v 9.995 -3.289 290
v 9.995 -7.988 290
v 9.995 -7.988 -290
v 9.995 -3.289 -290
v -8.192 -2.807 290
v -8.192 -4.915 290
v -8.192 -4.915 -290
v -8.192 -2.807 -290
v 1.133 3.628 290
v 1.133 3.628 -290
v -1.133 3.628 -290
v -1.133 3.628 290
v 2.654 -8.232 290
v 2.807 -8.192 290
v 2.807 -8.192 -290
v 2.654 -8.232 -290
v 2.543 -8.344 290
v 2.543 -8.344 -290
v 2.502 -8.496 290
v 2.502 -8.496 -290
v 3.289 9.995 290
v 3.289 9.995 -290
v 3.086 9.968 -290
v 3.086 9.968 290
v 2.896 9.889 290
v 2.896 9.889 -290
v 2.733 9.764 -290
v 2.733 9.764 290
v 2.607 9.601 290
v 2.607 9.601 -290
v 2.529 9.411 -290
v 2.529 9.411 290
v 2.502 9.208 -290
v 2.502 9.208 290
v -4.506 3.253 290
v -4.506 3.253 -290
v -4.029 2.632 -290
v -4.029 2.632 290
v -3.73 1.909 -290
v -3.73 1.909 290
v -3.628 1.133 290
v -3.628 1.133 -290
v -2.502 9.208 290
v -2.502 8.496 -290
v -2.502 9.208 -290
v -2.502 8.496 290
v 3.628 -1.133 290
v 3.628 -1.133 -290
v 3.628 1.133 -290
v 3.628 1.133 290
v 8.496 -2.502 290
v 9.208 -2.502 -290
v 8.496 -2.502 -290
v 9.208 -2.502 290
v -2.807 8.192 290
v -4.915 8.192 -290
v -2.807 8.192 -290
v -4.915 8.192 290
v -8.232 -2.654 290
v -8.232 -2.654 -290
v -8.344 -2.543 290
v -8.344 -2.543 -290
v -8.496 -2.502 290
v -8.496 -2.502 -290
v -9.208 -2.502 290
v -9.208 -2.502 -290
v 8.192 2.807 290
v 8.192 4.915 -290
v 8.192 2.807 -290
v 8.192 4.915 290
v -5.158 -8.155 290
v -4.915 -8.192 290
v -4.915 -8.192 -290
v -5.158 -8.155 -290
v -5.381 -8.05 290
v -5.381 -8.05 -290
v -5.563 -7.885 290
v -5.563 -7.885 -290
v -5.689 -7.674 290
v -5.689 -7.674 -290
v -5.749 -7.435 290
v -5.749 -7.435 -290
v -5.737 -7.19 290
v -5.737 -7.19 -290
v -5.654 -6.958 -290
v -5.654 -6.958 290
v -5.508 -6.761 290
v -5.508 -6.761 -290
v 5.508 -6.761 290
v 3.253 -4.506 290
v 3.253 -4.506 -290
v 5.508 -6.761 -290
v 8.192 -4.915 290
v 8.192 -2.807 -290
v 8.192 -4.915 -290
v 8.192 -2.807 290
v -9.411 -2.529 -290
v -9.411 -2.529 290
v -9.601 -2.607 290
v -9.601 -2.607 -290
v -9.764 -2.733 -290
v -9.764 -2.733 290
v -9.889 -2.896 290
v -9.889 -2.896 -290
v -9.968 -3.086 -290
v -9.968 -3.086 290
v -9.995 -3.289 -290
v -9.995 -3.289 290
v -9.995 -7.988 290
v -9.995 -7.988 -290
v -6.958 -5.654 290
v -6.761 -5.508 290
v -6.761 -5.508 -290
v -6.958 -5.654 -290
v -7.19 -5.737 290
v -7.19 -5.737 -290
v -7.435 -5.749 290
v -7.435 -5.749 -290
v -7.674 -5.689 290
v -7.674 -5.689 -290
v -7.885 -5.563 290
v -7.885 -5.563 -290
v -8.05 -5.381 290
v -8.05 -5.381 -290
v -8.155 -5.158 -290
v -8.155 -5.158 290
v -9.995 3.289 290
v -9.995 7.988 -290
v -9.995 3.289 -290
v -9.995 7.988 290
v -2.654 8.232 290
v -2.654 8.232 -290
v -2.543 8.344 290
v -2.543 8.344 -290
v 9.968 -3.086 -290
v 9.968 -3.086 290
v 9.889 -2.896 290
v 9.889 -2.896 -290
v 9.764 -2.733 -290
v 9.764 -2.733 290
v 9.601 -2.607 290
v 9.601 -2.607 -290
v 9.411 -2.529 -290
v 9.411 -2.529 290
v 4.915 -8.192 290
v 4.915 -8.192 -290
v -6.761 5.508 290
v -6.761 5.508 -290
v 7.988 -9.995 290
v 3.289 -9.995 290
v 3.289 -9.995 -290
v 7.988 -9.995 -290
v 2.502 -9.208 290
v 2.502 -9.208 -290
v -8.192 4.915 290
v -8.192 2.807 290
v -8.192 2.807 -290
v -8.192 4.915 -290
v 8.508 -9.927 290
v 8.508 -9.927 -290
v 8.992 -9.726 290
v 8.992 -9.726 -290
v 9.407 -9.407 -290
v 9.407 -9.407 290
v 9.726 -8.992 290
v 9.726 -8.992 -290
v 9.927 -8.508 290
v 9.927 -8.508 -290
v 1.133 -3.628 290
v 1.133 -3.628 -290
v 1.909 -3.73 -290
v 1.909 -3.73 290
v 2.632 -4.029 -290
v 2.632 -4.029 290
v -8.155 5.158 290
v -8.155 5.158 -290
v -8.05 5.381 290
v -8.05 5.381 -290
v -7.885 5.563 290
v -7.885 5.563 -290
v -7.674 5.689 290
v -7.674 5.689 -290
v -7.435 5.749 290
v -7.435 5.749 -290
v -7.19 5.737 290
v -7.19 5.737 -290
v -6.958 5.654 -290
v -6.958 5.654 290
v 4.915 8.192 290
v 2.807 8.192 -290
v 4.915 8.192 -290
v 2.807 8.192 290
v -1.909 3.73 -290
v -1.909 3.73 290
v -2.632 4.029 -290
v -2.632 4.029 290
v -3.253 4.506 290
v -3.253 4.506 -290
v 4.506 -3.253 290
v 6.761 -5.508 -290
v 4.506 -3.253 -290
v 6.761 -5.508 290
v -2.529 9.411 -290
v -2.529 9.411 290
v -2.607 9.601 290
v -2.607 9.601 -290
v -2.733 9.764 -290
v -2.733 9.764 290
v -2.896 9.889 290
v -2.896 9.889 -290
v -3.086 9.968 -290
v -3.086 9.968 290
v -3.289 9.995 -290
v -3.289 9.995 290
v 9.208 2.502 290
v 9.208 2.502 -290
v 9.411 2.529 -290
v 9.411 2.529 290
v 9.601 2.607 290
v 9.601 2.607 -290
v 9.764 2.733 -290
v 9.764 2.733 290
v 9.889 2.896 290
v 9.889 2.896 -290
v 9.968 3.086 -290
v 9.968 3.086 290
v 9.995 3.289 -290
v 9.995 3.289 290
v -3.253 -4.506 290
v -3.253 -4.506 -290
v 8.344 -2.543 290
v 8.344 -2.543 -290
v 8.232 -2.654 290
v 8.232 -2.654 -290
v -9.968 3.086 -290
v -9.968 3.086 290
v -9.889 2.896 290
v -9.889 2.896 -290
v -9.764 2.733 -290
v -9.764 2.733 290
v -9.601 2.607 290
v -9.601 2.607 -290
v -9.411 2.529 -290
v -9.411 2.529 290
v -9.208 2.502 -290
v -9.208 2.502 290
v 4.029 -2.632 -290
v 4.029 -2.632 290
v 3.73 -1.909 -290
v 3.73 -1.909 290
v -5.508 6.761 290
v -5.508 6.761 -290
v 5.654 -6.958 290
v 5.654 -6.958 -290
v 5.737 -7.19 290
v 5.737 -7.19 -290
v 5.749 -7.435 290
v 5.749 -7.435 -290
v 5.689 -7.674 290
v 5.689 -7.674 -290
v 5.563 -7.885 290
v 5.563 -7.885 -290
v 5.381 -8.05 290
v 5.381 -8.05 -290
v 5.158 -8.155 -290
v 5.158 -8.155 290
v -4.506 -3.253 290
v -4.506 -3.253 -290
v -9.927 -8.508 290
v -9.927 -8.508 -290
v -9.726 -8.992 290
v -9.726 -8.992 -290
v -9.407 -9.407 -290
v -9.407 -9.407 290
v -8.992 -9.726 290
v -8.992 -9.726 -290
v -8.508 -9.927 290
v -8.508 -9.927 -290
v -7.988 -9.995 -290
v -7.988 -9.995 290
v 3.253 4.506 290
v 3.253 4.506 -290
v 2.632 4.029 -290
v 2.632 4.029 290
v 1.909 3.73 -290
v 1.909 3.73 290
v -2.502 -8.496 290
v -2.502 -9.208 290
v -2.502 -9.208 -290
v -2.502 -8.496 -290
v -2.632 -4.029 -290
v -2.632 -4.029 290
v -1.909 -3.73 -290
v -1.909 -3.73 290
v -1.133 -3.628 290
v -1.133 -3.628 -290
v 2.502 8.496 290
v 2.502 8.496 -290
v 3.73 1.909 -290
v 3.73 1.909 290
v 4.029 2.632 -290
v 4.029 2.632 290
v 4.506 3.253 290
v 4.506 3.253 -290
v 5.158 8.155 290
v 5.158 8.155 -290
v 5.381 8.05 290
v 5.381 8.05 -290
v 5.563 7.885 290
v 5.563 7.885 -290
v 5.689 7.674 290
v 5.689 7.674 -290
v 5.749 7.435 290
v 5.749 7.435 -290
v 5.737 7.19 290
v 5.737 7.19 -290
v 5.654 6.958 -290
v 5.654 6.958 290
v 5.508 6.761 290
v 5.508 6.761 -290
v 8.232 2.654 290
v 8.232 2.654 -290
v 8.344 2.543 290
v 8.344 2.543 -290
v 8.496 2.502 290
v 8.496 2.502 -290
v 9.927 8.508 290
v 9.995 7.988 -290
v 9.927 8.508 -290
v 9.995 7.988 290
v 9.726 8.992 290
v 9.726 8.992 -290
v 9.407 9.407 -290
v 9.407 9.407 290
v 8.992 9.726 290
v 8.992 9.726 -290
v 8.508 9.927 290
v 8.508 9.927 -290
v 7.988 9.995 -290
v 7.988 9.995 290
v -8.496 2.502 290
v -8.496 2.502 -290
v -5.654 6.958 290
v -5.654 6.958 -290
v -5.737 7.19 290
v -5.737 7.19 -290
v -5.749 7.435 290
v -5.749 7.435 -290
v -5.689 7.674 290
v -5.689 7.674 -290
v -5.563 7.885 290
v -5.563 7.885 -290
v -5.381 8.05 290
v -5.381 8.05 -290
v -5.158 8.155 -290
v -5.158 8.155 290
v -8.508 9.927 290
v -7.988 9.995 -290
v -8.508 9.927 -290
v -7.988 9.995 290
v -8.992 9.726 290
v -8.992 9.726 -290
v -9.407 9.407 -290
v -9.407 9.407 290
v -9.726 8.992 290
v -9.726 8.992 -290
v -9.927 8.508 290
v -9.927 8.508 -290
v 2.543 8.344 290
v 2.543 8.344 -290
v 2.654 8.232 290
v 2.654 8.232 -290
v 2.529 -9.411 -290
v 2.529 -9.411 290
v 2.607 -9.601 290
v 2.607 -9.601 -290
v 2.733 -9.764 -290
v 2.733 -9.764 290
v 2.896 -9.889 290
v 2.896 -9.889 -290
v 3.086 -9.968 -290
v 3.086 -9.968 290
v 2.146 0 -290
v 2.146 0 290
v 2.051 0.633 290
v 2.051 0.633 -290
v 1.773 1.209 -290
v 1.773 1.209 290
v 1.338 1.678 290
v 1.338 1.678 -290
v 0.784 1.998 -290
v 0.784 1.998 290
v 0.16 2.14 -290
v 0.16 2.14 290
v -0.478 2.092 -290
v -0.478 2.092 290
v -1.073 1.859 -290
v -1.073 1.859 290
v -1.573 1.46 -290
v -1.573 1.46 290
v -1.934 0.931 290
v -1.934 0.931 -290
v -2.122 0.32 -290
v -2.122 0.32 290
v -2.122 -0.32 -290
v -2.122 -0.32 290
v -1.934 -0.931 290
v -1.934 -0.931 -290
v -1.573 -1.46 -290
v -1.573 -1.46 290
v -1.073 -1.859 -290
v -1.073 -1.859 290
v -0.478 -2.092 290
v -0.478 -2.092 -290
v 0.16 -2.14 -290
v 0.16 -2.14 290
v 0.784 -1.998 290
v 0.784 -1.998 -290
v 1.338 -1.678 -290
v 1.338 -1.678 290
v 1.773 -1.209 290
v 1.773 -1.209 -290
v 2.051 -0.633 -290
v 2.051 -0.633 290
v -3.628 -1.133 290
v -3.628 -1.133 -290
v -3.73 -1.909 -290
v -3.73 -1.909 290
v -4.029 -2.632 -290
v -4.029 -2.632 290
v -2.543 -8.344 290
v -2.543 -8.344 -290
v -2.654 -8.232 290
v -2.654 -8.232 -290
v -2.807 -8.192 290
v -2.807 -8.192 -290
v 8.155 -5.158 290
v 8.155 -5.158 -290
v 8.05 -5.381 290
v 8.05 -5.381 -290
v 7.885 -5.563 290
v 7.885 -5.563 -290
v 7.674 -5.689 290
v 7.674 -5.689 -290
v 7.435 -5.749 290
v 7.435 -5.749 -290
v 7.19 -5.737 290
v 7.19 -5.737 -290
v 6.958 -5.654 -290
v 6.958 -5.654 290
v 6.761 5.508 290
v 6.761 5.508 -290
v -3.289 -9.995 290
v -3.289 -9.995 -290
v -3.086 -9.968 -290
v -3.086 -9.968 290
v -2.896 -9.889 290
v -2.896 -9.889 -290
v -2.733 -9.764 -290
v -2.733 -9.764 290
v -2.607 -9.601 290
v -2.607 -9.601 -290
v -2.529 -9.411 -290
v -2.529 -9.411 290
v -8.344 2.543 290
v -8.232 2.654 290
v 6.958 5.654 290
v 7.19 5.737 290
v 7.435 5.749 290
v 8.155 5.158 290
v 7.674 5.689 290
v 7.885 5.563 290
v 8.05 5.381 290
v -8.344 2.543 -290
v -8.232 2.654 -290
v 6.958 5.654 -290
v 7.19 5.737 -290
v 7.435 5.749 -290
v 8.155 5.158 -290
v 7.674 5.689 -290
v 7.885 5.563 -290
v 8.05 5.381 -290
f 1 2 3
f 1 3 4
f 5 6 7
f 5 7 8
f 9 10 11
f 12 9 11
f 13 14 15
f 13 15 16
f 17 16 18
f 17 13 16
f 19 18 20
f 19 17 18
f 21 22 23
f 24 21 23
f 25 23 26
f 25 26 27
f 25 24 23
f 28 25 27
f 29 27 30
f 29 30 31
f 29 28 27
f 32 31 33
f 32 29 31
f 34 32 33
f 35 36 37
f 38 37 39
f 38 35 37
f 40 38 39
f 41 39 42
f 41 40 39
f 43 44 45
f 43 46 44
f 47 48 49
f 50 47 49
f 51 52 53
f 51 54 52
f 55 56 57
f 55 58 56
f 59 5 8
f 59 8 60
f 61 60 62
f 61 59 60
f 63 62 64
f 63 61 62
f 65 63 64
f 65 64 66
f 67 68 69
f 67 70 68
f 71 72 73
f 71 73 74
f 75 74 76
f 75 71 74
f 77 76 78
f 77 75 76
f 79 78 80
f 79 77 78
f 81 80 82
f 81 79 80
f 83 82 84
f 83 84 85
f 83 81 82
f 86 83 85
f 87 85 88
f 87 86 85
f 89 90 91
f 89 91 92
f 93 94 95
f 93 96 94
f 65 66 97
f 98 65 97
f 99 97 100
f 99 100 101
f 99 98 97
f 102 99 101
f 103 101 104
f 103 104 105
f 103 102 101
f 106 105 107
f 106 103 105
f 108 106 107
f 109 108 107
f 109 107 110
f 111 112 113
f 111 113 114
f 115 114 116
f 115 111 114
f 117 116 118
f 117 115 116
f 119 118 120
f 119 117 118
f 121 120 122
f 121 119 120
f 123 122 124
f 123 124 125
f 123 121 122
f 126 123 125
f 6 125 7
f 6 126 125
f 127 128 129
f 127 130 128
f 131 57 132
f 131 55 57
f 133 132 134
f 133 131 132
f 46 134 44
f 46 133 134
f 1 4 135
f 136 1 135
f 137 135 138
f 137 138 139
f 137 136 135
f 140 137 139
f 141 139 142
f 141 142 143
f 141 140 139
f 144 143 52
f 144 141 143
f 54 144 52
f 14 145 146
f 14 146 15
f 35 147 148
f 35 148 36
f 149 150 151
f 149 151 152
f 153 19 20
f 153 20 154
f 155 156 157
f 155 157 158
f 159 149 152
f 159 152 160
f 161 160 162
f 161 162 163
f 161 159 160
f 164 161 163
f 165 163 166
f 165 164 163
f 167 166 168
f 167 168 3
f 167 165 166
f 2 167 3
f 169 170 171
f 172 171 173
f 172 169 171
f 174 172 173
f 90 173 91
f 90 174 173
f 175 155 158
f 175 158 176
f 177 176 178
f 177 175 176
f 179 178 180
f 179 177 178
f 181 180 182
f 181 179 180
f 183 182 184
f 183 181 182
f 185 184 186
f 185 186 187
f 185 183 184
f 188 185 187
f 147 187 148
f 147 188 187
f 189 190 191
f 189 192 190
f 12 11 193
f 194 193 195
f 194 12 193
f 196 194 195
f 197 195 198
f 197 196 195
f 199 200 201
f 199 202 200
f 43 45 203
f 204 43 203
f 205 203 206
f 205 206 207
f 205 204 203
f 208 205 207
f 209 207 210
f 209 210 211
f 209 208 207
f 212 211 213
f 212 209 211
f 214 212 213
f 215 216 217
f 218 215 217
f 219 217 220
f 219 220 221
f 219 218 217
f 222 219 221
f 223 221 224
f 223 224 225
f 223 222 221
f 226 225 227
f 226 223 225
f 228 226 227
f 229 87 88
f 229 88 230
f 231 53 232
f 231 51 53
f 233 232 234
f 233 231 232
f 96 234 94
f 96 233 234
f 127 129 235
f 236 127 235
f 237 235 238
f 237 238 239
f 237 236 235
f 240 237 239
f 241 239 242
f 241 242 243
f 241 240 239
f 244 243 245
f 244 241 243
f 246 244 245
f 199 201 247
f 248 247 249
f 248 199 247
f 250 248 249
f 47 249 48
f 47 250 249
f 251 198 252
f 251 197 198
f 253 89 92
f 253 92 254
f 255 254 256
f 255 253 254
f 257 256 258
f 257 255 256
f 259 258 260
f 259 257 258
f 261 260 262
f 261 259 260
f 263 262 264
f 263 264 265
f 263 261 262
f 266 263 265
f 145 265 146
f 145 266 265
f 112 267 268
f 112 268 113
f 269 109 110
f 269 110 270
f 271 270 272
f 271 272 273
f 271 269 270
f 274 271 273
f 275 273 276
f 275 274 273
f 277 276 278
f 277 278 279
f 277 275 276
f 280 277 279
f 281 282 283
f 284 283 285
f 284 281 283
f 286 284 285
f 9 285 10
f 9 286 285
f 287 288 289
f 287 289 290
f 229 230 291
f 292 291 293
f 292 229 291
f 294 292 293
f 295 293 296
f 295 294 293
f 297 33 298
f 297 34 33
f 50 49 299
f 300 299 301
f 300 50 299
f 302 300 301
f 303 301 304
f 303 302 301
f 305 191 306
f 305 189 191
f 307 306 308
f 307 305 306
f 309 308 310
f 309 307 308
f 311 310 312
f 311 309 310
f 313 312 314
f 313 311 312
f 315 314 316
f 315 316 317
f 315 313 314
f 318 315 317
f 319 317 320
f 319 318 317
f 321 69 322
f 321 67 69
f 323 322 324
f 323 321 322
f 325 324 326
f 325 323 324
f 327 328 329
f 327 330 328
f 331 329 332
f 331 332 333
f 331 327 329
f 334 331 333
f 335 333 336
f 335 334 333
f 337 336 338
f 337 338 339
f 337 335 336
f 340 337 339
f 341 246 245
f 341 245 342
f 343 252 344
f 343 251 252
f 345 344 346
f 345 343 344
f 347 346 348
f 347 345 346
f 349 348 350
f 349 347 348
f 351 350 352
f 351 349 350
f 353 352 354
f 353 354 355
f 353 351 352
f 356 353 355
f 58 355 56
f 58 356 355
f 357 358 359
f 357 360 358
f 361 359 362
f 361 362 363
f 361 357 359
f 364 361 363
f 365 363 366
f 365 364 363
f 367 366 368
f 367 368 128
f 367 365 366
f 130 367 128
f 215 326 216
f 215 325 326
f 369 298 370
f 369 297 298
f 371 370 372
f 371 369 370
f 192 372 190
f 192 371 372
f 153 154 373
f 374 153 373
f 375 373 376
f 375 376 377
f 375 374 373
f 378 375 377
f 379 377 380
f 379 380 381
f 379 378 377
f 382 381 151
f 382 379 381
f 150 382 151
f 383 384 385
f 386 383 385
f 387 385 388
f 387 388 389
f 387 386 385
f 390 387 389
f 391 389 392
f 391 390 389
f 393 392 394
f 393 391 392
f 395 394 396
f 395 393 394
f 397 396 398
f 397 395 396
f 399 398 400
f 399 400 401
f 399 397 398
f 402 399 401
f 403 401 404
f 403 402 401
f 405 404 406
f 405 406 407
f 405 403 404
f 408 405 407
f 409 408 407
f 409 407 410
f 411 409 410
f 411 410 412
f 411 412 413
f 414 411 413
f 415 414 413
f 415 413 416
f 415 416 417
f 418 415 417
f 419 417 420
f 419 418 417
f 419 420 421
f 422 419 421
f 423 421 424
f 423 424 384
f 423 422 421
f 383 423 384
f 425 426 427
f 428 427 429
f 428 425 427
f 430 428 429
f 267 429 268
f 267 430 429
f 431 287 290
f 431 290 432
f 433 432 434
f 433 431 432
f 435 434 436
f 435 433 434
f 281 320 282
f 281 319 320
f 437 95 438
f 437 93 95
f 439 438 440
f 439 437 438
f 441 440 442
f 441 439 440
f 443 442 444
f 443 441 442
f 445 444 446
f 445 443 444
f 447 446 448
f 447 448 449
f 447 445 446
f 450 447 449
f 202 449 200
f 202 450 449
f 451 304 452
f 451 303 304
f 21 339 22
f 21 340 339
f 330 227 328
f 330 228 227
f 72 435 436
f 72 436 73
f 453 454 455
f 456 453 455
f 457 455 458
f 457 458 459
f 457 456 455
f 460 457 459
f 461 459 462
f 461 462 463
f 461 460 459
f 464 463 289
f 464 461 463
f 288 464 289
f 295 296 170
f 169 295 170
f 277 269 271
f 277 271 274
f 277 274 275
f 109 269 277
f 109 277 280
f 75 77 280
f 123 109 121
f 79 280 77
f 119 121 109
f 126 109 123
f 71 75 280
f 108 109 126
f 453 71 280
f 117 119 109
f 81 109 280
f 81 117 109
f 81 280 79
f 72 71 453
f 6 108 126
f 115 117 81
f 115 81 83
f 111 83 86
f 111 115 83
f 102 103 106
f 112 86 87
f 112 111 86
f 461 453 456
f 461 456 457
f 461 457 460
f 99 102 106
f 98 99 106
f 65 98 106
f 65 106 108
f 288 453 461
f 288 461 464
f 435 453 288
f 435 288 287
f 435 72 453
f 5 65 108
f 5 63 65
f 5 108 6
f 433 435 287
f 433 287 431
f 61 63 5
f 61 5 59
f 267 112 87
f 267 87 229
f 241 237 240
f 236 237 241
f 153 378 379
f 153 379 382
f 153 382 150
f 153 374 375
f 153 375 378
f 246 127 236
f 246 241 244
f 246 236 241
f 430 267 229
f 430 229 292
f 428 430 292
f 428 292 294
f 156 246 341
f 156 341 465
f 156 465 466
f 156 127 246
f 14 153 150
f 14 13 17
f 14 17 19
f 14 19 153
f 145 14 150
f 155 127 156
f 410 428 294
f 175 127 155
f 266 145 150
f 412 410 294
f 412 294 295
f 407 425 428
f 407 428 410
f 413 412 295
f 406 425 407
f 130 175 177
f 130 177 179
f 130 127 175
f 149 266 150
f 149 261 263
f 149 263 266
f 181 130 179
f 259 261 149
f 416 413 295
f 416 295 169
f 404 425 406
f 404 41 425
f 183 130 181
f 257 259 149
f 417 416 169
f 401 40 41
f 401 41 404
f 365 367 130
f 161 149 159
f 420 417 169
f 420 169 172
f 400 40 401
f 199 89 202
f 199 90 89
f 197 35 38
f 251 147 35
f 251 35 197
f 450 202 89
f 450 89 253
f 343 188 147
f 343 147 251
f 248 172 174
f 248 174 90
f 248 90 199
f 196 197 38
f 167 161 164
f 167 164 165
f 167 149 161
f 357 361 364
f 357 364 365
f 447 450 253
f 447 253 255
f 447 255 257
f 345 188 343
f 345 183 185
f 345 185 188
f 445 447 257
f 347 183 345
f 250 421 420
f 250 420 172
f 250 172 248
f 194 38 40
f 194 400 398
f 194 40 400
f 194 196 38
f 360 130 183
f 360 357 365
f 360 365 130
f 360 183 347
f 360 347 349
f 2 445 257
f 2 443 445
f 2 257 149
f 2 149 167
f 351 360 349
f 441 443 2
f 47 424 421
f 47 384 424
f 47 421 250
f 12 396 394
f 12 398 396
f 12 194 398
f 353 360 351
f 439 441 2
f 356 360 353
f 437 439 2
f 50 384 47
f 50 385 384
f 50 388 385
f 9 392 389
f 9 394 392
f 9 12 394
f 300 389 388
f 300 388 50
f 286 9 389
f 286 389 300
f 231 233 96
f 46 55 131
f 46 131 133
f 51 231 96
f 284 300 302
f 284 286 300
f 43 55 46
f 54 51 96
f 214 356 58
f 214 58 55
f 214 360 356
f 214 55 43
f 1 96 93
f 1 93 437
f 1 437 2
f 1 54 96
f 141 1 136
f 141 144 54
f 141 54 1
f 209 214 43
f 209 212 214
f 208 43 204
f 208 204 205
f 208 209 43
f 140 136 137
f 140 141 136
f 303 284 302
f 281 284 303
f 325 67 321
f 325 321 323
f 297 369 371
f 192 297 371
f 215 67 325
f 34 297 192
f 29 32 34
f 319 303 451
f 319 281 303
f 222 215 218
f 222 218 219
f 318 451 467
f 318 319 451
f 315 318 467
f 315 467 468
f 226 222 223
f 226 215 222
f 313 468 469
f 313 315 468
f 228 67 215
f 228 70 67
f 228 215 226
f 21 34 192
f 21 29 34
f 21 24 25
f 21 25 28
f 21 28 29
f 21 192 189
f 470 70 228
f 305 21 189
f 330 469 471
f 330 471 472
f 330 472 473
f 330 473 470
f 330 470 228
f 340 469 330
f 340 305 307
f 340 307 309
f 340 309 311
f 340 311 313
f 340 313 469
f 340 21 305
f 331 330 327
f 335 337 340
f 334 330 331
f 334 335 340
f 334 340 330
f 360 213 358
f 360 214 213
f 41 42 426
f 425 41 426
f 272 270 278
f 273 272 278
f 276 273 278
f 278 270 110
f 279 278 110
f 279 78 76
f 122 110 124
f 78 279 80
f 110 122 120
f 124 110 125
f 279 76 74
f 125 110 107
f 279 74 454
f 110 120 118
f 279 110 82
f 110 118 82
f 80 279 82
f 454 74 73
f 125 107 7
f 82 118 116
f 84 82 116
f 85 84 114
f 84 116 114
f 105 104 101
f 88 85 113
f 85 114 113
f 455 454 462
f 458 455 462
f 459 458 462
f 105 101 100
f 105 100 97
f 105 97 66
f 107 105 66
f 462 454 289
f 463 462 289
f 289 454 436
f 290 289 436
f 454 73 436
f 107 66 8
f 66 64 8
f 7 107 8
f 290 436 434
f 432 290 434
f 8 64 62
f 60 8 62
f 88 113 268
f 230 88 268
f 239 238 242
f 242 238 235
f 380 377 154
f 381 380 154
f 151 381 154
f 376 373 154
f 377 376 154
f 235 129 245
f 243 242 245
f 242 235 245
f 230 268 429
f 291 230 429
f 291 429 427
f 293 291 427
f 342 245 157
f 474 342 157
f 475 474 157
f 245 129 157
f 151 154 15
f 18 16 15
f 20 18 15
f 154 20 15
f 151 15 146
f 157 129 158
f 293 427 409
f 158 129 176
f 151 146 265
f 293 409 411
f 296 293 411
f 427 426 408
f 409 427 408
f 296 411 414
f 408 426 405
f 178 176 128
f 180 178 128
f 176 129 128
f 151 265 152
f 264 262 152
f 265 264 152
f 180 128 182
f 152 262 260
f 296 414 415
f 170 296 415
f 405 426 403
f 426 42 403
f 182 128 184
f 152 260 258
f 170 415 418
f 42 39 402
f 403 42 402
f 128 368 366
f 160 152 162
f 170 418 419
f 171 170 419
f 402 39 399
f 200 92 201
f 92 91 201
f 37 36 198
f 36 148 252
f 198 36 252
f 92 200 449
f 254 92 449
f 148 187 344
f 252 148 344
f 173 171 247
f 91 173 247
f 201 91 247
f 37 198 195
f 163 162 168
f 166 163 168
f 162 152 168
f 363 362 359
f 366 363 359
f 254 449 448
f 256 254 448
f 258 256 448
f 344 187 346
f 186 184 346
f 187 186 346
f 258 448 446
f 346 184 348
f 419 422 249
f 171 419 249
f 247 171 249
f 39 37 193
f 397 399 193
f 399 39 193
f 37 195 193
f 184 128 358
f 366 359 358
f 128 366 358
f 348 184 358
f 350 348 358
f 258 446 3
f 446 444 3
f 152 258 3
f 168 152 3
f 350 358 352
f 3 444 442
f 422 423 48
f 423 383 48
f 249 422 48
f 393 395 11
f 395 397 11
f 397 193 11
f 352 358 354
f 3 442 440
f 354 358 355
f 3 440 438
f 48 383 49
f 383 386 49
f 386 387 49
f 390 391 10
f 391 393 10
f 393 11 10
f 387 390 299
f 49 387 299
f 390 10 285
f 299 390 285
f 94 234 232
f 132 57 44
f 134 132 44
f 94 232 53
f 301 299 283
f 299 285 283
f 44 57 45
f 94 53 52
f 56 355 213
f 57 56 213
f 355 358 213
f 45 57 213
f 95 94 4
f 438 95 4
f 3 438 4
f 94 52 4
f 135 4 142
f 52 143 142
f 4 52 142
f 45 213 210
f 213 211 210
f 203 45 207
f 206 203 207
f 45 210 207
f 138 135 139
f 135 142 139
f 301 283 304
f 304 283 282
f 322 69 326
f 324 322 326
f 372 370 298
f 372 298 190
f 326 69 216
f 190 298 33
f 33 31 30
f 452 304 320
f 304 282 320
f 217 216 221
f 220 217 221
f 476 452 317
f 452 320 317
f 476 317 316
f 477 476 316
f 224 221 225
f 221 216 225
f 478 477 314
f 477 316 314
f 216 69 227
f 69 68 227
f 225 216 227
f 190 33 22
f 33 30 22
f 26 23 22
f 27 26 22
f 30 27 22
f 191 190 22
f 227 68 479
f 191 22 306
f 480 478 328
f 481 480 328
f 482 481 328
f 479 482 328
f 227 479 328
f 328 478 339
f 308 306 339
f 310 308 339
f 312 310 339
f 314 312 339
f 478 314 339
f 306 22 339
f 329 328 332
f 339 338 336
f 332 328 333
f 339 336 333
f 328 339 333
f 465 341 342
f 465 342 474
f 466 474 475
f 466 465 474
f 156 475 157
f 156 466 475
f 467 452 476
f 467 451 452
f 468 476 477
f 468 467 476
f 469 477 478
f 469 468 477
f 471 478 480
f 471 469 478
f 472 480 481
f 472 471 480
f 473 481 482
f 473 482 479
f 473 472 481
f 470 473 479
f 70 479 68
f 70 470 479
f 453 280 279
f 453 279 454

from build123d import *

# Parameters (mm, degrees)
SKETCH1_R           = 2.1463
BOSS_EXTRUDE1_DEPTH = 290


with BuildPart() as part:
    # Sketch1 → Boss-Extrude1 (new body, symmetric)
    with BuildSketch(Plane.XY):
        with BuildLine():
            Line((-9.9949, 7.9883), (-9.9949, 3.2893))
            ThreePointArc((-9.9949, 3.2893), (-9.76427588, 2.73252412), (-9.2075, 2.5019))
            Line((-9.2075, 2.5019), (-8.4963, 2.5019))
            ThreePointArc((-8.4963, 2.5019), (-8.280773853, 2.591173853), (-8.1915, 2.8067))
            Line((-8.1915, 2.8067), (-8.1915, 4.9149))
            ThreePointArc((-8.1915, 4.9149), (-7.674065253, 5.689295824), (-6.760603096, 5.507596904))
            Line((-6.760603096, 5.507596904), (-4.505765747, 3.252759555))
            ThreePointArc((-4.505765747, 3.252759555), (-3.856054457, 2.280397894), (-3.627906192, 1.133419111))
            Line((-3.627906192, 1.133419111), (-3.627906192, -1.133419111))
            ThreePointArc((-3.627906192, -1.133419111), (-3.856054457, -2.280397894), (-4.505765747, -3.252759555))
            Line((-4.505765747, -3.252759555), (-6.760603096, -5.507596904))
            ThreePointArc((-6.760603096, -5.507596904), (-7.674065253, -5.689295824), (-8.1915, -4.9149))
            Line((-8.1915, -4.9149), (-8.1915, -2.8067))
            ThreePointArc((-8.1915, -2.8067), (-8.280773853, -2.591173853), (-8.4963, -2.5019))
            Line((-8.4963, -2.5019), (-9.2075, -2.5019))
            ThreePointArc((-9.2075, -2.5019), (-9.76427588, -2.73252412), (-9.9949, -3.2893))
            Line((-9.9949, -3.2893), (-9.9949, -7.9883))
            ThreePointArc((-9.9949, -7.9883), (-9.407180467, -9.407180467), (-7.9883, -9.9949))
            Line((-7.9883, -9.9949), (-3.2893, -9.9949))
            ThreePointArc((-3.2893, -9.9949), (-2.73252412, -9.76427588), (-2.5019, -9.2075))
            Line((-2.5019, -9.2075), (-2.5019, -8.4963))
            ThreePointArc((-2.5019, -8.4963), (-2.591173853, -8.280773853), (-2.8067, -8.1915))
            Line((-2.8067, -8.1915), (-4.9149, -8.1915))
            ThreePointArc((-4.9149, -8.1915), (-5.689295824, -7.674065253), (-5.507596904, -6.760603096))
            Line((-5.507596904, -6.760603096), (-3.252759555, -4.505765747))
            ThreePointArc((-3.252759555, -4.505765747), (-2.280397894, -3.856054457), (-1.133419111, -3.627906192))
            Line((-1.133419111, -3.627906192), (1.133419111, -3.627906192))
            ThreePointArc((1.133419111, -3.627906192), (2.280397894, -3.856054457), (3.252759555, -4.505765747))
            Line((3.252759555, -4.505765747), (5.507596904, -6.760603096))
            ThreePointArc((5.507596904, -6.760603096), (5.689295824, -7.674065253), (4.9149, -8.1915))
            Line((4.9149, -8.1915), (2.8067, -8.1915))
            ThreePointArc((2.8067, -8.1915), (2.591173853, -8.280773853), (2.5019, -8.4963))
            Line((2.5019, -8.4963), (2.5019, -9.2075))
            ThreePointArc((2.5019, -9.2075), (2.73252412, -9.76427588), (3.2893, -9.9949))
            Line((3.2893, -9.9949), (7.9883, -9.9949))
            ThreePointArc((7.9883, -9.9949), (9.407180467, -9.407180467), (9.9949, -7.9883))
            Line((9.9949, -7.9883), (9.9949, -3.2893))
            ThreePointArc((9.9949, -3.2893), (9.76427588, -2.73252412), (9.2075, -2.5019))
            Line((9.2075, -2.5019), (8.4963, -2.5019))
            ThreePointArc((8.4963, -2.5019), (8.280773853, -2.591173853), (8.1915, -2.8067))
            Line((8.1915, -2.8067), (8.1915, -4.9149))
            ThreePointArc((8.1915, -4.9149), (7.674065253, -5.689295824), (6.760603096, -5.507596904))
            Line((6.760603096, -5.507596904), (4.505765747, -3.252759555))
            ThreePointArc((4.505765747, -3.252759555), (3.856054457, -2.280397894), (3.627906192, -1.133419111))
            Line((3.627906192, -1.133419111), (3.627906192, 1.133419111))
            ThreePointArc((3.627906192, 1.133419111), (3.856054457, 2.280397894), (4.505765747, 3.252759555))
            Line((4.505765747, 3.252759555), (6.760603096, 5.507596904))
            ThreePointArc((6.760603096, 5.507596904), (7.674065253, 5.689295824), (8.1915, 4.9149))
            Line((8.1915, 4.9149), (8.1915, 2.8067))
            ThreePointArc((8.1915, 2.8067), (8.280773853, 2.591173853), (8.4963, 2.5019))
            Line((8.4963, 2.5019), (9.2075, 2.5019))
            ThreePointArc((9.2075, 2.5019), (9.76427588, 2.73252412), (9.9949, 3.2893))
            Line((9.9949, 3.2893), (9.9949, 7.9883))
            ThreePointArc((9.9949, 7.9883), (9.407180467, 9.407180467), (7.9883, 9.9949))
            Line((7.9883, 9.9949), (3.2893, 9.9949))
            ThreePointArc((3.2893, 9.9949), (2.73252412, 9.76427588), (2.5019, 9.2075))
            Line((2.5019, 9.2075), (2.5019, 8.4963))
            ThreePointArc((2.5019, 8.4963), (2.591173853, 8.280773853), (2.8067, 8.1915))
            Line((2.8067, 8.1915), (4.9149, 8.1915))
            ThreePointArc((4.9149, 8.1915), (5.689295824, 7.674065253), (5.507596904, 6.760603096))
            Line((5.507596904, 6.760603096), (3.252759555, 4.505765747))
            ThreePointArc((3.252759555, 4.505765747), (2.280397894, 3.856054457), (1.133419111, 3.627906192))
            Line((1.133419111, 3.627906192), (-1.133419111, 3.627906192))
            ThreePointArc((-1.133419111, 3.627906192), (-2.280397894, 3.856054457), (-3.252759555, 4.505765747))
            Line((-3.252759555, 4.505765747), (-5.507596904, 6.760603096))
            ThreePointArc((-5.507596904, 6.760603096), (-5.689295824, 7.674065253), (-4.9149, 8.1915))
            Line((-4.9149, 8.1915), (-2.8067, 8.1915))
            ThreePointArc((-2.8067, 8.1915), (-2.591173853, 8.280773853), (-2.5019, 8.4963))
            Line((-2.5019, 8.4963), (-2.5019, 9.2075))
            ThreePointArc((-2.5019, 9.2075), (-2.73252412, 9.76427588), (-3.2893, 9.9949))
            Line((-3.2893, 9.9949), (-7.9883, 9.9949))
            ThreePointArc((-7.9883, 9.9949), (-9.407180467, 9.407180467), (-9.9949, 7.9883))
        make_face()
        Circle(SKETCH1_R, mode=Mode.SUBTRACT)
    extrude(amount=BOSS_EXTRUDE1_DEPTH, both=True)


solid = part.part
